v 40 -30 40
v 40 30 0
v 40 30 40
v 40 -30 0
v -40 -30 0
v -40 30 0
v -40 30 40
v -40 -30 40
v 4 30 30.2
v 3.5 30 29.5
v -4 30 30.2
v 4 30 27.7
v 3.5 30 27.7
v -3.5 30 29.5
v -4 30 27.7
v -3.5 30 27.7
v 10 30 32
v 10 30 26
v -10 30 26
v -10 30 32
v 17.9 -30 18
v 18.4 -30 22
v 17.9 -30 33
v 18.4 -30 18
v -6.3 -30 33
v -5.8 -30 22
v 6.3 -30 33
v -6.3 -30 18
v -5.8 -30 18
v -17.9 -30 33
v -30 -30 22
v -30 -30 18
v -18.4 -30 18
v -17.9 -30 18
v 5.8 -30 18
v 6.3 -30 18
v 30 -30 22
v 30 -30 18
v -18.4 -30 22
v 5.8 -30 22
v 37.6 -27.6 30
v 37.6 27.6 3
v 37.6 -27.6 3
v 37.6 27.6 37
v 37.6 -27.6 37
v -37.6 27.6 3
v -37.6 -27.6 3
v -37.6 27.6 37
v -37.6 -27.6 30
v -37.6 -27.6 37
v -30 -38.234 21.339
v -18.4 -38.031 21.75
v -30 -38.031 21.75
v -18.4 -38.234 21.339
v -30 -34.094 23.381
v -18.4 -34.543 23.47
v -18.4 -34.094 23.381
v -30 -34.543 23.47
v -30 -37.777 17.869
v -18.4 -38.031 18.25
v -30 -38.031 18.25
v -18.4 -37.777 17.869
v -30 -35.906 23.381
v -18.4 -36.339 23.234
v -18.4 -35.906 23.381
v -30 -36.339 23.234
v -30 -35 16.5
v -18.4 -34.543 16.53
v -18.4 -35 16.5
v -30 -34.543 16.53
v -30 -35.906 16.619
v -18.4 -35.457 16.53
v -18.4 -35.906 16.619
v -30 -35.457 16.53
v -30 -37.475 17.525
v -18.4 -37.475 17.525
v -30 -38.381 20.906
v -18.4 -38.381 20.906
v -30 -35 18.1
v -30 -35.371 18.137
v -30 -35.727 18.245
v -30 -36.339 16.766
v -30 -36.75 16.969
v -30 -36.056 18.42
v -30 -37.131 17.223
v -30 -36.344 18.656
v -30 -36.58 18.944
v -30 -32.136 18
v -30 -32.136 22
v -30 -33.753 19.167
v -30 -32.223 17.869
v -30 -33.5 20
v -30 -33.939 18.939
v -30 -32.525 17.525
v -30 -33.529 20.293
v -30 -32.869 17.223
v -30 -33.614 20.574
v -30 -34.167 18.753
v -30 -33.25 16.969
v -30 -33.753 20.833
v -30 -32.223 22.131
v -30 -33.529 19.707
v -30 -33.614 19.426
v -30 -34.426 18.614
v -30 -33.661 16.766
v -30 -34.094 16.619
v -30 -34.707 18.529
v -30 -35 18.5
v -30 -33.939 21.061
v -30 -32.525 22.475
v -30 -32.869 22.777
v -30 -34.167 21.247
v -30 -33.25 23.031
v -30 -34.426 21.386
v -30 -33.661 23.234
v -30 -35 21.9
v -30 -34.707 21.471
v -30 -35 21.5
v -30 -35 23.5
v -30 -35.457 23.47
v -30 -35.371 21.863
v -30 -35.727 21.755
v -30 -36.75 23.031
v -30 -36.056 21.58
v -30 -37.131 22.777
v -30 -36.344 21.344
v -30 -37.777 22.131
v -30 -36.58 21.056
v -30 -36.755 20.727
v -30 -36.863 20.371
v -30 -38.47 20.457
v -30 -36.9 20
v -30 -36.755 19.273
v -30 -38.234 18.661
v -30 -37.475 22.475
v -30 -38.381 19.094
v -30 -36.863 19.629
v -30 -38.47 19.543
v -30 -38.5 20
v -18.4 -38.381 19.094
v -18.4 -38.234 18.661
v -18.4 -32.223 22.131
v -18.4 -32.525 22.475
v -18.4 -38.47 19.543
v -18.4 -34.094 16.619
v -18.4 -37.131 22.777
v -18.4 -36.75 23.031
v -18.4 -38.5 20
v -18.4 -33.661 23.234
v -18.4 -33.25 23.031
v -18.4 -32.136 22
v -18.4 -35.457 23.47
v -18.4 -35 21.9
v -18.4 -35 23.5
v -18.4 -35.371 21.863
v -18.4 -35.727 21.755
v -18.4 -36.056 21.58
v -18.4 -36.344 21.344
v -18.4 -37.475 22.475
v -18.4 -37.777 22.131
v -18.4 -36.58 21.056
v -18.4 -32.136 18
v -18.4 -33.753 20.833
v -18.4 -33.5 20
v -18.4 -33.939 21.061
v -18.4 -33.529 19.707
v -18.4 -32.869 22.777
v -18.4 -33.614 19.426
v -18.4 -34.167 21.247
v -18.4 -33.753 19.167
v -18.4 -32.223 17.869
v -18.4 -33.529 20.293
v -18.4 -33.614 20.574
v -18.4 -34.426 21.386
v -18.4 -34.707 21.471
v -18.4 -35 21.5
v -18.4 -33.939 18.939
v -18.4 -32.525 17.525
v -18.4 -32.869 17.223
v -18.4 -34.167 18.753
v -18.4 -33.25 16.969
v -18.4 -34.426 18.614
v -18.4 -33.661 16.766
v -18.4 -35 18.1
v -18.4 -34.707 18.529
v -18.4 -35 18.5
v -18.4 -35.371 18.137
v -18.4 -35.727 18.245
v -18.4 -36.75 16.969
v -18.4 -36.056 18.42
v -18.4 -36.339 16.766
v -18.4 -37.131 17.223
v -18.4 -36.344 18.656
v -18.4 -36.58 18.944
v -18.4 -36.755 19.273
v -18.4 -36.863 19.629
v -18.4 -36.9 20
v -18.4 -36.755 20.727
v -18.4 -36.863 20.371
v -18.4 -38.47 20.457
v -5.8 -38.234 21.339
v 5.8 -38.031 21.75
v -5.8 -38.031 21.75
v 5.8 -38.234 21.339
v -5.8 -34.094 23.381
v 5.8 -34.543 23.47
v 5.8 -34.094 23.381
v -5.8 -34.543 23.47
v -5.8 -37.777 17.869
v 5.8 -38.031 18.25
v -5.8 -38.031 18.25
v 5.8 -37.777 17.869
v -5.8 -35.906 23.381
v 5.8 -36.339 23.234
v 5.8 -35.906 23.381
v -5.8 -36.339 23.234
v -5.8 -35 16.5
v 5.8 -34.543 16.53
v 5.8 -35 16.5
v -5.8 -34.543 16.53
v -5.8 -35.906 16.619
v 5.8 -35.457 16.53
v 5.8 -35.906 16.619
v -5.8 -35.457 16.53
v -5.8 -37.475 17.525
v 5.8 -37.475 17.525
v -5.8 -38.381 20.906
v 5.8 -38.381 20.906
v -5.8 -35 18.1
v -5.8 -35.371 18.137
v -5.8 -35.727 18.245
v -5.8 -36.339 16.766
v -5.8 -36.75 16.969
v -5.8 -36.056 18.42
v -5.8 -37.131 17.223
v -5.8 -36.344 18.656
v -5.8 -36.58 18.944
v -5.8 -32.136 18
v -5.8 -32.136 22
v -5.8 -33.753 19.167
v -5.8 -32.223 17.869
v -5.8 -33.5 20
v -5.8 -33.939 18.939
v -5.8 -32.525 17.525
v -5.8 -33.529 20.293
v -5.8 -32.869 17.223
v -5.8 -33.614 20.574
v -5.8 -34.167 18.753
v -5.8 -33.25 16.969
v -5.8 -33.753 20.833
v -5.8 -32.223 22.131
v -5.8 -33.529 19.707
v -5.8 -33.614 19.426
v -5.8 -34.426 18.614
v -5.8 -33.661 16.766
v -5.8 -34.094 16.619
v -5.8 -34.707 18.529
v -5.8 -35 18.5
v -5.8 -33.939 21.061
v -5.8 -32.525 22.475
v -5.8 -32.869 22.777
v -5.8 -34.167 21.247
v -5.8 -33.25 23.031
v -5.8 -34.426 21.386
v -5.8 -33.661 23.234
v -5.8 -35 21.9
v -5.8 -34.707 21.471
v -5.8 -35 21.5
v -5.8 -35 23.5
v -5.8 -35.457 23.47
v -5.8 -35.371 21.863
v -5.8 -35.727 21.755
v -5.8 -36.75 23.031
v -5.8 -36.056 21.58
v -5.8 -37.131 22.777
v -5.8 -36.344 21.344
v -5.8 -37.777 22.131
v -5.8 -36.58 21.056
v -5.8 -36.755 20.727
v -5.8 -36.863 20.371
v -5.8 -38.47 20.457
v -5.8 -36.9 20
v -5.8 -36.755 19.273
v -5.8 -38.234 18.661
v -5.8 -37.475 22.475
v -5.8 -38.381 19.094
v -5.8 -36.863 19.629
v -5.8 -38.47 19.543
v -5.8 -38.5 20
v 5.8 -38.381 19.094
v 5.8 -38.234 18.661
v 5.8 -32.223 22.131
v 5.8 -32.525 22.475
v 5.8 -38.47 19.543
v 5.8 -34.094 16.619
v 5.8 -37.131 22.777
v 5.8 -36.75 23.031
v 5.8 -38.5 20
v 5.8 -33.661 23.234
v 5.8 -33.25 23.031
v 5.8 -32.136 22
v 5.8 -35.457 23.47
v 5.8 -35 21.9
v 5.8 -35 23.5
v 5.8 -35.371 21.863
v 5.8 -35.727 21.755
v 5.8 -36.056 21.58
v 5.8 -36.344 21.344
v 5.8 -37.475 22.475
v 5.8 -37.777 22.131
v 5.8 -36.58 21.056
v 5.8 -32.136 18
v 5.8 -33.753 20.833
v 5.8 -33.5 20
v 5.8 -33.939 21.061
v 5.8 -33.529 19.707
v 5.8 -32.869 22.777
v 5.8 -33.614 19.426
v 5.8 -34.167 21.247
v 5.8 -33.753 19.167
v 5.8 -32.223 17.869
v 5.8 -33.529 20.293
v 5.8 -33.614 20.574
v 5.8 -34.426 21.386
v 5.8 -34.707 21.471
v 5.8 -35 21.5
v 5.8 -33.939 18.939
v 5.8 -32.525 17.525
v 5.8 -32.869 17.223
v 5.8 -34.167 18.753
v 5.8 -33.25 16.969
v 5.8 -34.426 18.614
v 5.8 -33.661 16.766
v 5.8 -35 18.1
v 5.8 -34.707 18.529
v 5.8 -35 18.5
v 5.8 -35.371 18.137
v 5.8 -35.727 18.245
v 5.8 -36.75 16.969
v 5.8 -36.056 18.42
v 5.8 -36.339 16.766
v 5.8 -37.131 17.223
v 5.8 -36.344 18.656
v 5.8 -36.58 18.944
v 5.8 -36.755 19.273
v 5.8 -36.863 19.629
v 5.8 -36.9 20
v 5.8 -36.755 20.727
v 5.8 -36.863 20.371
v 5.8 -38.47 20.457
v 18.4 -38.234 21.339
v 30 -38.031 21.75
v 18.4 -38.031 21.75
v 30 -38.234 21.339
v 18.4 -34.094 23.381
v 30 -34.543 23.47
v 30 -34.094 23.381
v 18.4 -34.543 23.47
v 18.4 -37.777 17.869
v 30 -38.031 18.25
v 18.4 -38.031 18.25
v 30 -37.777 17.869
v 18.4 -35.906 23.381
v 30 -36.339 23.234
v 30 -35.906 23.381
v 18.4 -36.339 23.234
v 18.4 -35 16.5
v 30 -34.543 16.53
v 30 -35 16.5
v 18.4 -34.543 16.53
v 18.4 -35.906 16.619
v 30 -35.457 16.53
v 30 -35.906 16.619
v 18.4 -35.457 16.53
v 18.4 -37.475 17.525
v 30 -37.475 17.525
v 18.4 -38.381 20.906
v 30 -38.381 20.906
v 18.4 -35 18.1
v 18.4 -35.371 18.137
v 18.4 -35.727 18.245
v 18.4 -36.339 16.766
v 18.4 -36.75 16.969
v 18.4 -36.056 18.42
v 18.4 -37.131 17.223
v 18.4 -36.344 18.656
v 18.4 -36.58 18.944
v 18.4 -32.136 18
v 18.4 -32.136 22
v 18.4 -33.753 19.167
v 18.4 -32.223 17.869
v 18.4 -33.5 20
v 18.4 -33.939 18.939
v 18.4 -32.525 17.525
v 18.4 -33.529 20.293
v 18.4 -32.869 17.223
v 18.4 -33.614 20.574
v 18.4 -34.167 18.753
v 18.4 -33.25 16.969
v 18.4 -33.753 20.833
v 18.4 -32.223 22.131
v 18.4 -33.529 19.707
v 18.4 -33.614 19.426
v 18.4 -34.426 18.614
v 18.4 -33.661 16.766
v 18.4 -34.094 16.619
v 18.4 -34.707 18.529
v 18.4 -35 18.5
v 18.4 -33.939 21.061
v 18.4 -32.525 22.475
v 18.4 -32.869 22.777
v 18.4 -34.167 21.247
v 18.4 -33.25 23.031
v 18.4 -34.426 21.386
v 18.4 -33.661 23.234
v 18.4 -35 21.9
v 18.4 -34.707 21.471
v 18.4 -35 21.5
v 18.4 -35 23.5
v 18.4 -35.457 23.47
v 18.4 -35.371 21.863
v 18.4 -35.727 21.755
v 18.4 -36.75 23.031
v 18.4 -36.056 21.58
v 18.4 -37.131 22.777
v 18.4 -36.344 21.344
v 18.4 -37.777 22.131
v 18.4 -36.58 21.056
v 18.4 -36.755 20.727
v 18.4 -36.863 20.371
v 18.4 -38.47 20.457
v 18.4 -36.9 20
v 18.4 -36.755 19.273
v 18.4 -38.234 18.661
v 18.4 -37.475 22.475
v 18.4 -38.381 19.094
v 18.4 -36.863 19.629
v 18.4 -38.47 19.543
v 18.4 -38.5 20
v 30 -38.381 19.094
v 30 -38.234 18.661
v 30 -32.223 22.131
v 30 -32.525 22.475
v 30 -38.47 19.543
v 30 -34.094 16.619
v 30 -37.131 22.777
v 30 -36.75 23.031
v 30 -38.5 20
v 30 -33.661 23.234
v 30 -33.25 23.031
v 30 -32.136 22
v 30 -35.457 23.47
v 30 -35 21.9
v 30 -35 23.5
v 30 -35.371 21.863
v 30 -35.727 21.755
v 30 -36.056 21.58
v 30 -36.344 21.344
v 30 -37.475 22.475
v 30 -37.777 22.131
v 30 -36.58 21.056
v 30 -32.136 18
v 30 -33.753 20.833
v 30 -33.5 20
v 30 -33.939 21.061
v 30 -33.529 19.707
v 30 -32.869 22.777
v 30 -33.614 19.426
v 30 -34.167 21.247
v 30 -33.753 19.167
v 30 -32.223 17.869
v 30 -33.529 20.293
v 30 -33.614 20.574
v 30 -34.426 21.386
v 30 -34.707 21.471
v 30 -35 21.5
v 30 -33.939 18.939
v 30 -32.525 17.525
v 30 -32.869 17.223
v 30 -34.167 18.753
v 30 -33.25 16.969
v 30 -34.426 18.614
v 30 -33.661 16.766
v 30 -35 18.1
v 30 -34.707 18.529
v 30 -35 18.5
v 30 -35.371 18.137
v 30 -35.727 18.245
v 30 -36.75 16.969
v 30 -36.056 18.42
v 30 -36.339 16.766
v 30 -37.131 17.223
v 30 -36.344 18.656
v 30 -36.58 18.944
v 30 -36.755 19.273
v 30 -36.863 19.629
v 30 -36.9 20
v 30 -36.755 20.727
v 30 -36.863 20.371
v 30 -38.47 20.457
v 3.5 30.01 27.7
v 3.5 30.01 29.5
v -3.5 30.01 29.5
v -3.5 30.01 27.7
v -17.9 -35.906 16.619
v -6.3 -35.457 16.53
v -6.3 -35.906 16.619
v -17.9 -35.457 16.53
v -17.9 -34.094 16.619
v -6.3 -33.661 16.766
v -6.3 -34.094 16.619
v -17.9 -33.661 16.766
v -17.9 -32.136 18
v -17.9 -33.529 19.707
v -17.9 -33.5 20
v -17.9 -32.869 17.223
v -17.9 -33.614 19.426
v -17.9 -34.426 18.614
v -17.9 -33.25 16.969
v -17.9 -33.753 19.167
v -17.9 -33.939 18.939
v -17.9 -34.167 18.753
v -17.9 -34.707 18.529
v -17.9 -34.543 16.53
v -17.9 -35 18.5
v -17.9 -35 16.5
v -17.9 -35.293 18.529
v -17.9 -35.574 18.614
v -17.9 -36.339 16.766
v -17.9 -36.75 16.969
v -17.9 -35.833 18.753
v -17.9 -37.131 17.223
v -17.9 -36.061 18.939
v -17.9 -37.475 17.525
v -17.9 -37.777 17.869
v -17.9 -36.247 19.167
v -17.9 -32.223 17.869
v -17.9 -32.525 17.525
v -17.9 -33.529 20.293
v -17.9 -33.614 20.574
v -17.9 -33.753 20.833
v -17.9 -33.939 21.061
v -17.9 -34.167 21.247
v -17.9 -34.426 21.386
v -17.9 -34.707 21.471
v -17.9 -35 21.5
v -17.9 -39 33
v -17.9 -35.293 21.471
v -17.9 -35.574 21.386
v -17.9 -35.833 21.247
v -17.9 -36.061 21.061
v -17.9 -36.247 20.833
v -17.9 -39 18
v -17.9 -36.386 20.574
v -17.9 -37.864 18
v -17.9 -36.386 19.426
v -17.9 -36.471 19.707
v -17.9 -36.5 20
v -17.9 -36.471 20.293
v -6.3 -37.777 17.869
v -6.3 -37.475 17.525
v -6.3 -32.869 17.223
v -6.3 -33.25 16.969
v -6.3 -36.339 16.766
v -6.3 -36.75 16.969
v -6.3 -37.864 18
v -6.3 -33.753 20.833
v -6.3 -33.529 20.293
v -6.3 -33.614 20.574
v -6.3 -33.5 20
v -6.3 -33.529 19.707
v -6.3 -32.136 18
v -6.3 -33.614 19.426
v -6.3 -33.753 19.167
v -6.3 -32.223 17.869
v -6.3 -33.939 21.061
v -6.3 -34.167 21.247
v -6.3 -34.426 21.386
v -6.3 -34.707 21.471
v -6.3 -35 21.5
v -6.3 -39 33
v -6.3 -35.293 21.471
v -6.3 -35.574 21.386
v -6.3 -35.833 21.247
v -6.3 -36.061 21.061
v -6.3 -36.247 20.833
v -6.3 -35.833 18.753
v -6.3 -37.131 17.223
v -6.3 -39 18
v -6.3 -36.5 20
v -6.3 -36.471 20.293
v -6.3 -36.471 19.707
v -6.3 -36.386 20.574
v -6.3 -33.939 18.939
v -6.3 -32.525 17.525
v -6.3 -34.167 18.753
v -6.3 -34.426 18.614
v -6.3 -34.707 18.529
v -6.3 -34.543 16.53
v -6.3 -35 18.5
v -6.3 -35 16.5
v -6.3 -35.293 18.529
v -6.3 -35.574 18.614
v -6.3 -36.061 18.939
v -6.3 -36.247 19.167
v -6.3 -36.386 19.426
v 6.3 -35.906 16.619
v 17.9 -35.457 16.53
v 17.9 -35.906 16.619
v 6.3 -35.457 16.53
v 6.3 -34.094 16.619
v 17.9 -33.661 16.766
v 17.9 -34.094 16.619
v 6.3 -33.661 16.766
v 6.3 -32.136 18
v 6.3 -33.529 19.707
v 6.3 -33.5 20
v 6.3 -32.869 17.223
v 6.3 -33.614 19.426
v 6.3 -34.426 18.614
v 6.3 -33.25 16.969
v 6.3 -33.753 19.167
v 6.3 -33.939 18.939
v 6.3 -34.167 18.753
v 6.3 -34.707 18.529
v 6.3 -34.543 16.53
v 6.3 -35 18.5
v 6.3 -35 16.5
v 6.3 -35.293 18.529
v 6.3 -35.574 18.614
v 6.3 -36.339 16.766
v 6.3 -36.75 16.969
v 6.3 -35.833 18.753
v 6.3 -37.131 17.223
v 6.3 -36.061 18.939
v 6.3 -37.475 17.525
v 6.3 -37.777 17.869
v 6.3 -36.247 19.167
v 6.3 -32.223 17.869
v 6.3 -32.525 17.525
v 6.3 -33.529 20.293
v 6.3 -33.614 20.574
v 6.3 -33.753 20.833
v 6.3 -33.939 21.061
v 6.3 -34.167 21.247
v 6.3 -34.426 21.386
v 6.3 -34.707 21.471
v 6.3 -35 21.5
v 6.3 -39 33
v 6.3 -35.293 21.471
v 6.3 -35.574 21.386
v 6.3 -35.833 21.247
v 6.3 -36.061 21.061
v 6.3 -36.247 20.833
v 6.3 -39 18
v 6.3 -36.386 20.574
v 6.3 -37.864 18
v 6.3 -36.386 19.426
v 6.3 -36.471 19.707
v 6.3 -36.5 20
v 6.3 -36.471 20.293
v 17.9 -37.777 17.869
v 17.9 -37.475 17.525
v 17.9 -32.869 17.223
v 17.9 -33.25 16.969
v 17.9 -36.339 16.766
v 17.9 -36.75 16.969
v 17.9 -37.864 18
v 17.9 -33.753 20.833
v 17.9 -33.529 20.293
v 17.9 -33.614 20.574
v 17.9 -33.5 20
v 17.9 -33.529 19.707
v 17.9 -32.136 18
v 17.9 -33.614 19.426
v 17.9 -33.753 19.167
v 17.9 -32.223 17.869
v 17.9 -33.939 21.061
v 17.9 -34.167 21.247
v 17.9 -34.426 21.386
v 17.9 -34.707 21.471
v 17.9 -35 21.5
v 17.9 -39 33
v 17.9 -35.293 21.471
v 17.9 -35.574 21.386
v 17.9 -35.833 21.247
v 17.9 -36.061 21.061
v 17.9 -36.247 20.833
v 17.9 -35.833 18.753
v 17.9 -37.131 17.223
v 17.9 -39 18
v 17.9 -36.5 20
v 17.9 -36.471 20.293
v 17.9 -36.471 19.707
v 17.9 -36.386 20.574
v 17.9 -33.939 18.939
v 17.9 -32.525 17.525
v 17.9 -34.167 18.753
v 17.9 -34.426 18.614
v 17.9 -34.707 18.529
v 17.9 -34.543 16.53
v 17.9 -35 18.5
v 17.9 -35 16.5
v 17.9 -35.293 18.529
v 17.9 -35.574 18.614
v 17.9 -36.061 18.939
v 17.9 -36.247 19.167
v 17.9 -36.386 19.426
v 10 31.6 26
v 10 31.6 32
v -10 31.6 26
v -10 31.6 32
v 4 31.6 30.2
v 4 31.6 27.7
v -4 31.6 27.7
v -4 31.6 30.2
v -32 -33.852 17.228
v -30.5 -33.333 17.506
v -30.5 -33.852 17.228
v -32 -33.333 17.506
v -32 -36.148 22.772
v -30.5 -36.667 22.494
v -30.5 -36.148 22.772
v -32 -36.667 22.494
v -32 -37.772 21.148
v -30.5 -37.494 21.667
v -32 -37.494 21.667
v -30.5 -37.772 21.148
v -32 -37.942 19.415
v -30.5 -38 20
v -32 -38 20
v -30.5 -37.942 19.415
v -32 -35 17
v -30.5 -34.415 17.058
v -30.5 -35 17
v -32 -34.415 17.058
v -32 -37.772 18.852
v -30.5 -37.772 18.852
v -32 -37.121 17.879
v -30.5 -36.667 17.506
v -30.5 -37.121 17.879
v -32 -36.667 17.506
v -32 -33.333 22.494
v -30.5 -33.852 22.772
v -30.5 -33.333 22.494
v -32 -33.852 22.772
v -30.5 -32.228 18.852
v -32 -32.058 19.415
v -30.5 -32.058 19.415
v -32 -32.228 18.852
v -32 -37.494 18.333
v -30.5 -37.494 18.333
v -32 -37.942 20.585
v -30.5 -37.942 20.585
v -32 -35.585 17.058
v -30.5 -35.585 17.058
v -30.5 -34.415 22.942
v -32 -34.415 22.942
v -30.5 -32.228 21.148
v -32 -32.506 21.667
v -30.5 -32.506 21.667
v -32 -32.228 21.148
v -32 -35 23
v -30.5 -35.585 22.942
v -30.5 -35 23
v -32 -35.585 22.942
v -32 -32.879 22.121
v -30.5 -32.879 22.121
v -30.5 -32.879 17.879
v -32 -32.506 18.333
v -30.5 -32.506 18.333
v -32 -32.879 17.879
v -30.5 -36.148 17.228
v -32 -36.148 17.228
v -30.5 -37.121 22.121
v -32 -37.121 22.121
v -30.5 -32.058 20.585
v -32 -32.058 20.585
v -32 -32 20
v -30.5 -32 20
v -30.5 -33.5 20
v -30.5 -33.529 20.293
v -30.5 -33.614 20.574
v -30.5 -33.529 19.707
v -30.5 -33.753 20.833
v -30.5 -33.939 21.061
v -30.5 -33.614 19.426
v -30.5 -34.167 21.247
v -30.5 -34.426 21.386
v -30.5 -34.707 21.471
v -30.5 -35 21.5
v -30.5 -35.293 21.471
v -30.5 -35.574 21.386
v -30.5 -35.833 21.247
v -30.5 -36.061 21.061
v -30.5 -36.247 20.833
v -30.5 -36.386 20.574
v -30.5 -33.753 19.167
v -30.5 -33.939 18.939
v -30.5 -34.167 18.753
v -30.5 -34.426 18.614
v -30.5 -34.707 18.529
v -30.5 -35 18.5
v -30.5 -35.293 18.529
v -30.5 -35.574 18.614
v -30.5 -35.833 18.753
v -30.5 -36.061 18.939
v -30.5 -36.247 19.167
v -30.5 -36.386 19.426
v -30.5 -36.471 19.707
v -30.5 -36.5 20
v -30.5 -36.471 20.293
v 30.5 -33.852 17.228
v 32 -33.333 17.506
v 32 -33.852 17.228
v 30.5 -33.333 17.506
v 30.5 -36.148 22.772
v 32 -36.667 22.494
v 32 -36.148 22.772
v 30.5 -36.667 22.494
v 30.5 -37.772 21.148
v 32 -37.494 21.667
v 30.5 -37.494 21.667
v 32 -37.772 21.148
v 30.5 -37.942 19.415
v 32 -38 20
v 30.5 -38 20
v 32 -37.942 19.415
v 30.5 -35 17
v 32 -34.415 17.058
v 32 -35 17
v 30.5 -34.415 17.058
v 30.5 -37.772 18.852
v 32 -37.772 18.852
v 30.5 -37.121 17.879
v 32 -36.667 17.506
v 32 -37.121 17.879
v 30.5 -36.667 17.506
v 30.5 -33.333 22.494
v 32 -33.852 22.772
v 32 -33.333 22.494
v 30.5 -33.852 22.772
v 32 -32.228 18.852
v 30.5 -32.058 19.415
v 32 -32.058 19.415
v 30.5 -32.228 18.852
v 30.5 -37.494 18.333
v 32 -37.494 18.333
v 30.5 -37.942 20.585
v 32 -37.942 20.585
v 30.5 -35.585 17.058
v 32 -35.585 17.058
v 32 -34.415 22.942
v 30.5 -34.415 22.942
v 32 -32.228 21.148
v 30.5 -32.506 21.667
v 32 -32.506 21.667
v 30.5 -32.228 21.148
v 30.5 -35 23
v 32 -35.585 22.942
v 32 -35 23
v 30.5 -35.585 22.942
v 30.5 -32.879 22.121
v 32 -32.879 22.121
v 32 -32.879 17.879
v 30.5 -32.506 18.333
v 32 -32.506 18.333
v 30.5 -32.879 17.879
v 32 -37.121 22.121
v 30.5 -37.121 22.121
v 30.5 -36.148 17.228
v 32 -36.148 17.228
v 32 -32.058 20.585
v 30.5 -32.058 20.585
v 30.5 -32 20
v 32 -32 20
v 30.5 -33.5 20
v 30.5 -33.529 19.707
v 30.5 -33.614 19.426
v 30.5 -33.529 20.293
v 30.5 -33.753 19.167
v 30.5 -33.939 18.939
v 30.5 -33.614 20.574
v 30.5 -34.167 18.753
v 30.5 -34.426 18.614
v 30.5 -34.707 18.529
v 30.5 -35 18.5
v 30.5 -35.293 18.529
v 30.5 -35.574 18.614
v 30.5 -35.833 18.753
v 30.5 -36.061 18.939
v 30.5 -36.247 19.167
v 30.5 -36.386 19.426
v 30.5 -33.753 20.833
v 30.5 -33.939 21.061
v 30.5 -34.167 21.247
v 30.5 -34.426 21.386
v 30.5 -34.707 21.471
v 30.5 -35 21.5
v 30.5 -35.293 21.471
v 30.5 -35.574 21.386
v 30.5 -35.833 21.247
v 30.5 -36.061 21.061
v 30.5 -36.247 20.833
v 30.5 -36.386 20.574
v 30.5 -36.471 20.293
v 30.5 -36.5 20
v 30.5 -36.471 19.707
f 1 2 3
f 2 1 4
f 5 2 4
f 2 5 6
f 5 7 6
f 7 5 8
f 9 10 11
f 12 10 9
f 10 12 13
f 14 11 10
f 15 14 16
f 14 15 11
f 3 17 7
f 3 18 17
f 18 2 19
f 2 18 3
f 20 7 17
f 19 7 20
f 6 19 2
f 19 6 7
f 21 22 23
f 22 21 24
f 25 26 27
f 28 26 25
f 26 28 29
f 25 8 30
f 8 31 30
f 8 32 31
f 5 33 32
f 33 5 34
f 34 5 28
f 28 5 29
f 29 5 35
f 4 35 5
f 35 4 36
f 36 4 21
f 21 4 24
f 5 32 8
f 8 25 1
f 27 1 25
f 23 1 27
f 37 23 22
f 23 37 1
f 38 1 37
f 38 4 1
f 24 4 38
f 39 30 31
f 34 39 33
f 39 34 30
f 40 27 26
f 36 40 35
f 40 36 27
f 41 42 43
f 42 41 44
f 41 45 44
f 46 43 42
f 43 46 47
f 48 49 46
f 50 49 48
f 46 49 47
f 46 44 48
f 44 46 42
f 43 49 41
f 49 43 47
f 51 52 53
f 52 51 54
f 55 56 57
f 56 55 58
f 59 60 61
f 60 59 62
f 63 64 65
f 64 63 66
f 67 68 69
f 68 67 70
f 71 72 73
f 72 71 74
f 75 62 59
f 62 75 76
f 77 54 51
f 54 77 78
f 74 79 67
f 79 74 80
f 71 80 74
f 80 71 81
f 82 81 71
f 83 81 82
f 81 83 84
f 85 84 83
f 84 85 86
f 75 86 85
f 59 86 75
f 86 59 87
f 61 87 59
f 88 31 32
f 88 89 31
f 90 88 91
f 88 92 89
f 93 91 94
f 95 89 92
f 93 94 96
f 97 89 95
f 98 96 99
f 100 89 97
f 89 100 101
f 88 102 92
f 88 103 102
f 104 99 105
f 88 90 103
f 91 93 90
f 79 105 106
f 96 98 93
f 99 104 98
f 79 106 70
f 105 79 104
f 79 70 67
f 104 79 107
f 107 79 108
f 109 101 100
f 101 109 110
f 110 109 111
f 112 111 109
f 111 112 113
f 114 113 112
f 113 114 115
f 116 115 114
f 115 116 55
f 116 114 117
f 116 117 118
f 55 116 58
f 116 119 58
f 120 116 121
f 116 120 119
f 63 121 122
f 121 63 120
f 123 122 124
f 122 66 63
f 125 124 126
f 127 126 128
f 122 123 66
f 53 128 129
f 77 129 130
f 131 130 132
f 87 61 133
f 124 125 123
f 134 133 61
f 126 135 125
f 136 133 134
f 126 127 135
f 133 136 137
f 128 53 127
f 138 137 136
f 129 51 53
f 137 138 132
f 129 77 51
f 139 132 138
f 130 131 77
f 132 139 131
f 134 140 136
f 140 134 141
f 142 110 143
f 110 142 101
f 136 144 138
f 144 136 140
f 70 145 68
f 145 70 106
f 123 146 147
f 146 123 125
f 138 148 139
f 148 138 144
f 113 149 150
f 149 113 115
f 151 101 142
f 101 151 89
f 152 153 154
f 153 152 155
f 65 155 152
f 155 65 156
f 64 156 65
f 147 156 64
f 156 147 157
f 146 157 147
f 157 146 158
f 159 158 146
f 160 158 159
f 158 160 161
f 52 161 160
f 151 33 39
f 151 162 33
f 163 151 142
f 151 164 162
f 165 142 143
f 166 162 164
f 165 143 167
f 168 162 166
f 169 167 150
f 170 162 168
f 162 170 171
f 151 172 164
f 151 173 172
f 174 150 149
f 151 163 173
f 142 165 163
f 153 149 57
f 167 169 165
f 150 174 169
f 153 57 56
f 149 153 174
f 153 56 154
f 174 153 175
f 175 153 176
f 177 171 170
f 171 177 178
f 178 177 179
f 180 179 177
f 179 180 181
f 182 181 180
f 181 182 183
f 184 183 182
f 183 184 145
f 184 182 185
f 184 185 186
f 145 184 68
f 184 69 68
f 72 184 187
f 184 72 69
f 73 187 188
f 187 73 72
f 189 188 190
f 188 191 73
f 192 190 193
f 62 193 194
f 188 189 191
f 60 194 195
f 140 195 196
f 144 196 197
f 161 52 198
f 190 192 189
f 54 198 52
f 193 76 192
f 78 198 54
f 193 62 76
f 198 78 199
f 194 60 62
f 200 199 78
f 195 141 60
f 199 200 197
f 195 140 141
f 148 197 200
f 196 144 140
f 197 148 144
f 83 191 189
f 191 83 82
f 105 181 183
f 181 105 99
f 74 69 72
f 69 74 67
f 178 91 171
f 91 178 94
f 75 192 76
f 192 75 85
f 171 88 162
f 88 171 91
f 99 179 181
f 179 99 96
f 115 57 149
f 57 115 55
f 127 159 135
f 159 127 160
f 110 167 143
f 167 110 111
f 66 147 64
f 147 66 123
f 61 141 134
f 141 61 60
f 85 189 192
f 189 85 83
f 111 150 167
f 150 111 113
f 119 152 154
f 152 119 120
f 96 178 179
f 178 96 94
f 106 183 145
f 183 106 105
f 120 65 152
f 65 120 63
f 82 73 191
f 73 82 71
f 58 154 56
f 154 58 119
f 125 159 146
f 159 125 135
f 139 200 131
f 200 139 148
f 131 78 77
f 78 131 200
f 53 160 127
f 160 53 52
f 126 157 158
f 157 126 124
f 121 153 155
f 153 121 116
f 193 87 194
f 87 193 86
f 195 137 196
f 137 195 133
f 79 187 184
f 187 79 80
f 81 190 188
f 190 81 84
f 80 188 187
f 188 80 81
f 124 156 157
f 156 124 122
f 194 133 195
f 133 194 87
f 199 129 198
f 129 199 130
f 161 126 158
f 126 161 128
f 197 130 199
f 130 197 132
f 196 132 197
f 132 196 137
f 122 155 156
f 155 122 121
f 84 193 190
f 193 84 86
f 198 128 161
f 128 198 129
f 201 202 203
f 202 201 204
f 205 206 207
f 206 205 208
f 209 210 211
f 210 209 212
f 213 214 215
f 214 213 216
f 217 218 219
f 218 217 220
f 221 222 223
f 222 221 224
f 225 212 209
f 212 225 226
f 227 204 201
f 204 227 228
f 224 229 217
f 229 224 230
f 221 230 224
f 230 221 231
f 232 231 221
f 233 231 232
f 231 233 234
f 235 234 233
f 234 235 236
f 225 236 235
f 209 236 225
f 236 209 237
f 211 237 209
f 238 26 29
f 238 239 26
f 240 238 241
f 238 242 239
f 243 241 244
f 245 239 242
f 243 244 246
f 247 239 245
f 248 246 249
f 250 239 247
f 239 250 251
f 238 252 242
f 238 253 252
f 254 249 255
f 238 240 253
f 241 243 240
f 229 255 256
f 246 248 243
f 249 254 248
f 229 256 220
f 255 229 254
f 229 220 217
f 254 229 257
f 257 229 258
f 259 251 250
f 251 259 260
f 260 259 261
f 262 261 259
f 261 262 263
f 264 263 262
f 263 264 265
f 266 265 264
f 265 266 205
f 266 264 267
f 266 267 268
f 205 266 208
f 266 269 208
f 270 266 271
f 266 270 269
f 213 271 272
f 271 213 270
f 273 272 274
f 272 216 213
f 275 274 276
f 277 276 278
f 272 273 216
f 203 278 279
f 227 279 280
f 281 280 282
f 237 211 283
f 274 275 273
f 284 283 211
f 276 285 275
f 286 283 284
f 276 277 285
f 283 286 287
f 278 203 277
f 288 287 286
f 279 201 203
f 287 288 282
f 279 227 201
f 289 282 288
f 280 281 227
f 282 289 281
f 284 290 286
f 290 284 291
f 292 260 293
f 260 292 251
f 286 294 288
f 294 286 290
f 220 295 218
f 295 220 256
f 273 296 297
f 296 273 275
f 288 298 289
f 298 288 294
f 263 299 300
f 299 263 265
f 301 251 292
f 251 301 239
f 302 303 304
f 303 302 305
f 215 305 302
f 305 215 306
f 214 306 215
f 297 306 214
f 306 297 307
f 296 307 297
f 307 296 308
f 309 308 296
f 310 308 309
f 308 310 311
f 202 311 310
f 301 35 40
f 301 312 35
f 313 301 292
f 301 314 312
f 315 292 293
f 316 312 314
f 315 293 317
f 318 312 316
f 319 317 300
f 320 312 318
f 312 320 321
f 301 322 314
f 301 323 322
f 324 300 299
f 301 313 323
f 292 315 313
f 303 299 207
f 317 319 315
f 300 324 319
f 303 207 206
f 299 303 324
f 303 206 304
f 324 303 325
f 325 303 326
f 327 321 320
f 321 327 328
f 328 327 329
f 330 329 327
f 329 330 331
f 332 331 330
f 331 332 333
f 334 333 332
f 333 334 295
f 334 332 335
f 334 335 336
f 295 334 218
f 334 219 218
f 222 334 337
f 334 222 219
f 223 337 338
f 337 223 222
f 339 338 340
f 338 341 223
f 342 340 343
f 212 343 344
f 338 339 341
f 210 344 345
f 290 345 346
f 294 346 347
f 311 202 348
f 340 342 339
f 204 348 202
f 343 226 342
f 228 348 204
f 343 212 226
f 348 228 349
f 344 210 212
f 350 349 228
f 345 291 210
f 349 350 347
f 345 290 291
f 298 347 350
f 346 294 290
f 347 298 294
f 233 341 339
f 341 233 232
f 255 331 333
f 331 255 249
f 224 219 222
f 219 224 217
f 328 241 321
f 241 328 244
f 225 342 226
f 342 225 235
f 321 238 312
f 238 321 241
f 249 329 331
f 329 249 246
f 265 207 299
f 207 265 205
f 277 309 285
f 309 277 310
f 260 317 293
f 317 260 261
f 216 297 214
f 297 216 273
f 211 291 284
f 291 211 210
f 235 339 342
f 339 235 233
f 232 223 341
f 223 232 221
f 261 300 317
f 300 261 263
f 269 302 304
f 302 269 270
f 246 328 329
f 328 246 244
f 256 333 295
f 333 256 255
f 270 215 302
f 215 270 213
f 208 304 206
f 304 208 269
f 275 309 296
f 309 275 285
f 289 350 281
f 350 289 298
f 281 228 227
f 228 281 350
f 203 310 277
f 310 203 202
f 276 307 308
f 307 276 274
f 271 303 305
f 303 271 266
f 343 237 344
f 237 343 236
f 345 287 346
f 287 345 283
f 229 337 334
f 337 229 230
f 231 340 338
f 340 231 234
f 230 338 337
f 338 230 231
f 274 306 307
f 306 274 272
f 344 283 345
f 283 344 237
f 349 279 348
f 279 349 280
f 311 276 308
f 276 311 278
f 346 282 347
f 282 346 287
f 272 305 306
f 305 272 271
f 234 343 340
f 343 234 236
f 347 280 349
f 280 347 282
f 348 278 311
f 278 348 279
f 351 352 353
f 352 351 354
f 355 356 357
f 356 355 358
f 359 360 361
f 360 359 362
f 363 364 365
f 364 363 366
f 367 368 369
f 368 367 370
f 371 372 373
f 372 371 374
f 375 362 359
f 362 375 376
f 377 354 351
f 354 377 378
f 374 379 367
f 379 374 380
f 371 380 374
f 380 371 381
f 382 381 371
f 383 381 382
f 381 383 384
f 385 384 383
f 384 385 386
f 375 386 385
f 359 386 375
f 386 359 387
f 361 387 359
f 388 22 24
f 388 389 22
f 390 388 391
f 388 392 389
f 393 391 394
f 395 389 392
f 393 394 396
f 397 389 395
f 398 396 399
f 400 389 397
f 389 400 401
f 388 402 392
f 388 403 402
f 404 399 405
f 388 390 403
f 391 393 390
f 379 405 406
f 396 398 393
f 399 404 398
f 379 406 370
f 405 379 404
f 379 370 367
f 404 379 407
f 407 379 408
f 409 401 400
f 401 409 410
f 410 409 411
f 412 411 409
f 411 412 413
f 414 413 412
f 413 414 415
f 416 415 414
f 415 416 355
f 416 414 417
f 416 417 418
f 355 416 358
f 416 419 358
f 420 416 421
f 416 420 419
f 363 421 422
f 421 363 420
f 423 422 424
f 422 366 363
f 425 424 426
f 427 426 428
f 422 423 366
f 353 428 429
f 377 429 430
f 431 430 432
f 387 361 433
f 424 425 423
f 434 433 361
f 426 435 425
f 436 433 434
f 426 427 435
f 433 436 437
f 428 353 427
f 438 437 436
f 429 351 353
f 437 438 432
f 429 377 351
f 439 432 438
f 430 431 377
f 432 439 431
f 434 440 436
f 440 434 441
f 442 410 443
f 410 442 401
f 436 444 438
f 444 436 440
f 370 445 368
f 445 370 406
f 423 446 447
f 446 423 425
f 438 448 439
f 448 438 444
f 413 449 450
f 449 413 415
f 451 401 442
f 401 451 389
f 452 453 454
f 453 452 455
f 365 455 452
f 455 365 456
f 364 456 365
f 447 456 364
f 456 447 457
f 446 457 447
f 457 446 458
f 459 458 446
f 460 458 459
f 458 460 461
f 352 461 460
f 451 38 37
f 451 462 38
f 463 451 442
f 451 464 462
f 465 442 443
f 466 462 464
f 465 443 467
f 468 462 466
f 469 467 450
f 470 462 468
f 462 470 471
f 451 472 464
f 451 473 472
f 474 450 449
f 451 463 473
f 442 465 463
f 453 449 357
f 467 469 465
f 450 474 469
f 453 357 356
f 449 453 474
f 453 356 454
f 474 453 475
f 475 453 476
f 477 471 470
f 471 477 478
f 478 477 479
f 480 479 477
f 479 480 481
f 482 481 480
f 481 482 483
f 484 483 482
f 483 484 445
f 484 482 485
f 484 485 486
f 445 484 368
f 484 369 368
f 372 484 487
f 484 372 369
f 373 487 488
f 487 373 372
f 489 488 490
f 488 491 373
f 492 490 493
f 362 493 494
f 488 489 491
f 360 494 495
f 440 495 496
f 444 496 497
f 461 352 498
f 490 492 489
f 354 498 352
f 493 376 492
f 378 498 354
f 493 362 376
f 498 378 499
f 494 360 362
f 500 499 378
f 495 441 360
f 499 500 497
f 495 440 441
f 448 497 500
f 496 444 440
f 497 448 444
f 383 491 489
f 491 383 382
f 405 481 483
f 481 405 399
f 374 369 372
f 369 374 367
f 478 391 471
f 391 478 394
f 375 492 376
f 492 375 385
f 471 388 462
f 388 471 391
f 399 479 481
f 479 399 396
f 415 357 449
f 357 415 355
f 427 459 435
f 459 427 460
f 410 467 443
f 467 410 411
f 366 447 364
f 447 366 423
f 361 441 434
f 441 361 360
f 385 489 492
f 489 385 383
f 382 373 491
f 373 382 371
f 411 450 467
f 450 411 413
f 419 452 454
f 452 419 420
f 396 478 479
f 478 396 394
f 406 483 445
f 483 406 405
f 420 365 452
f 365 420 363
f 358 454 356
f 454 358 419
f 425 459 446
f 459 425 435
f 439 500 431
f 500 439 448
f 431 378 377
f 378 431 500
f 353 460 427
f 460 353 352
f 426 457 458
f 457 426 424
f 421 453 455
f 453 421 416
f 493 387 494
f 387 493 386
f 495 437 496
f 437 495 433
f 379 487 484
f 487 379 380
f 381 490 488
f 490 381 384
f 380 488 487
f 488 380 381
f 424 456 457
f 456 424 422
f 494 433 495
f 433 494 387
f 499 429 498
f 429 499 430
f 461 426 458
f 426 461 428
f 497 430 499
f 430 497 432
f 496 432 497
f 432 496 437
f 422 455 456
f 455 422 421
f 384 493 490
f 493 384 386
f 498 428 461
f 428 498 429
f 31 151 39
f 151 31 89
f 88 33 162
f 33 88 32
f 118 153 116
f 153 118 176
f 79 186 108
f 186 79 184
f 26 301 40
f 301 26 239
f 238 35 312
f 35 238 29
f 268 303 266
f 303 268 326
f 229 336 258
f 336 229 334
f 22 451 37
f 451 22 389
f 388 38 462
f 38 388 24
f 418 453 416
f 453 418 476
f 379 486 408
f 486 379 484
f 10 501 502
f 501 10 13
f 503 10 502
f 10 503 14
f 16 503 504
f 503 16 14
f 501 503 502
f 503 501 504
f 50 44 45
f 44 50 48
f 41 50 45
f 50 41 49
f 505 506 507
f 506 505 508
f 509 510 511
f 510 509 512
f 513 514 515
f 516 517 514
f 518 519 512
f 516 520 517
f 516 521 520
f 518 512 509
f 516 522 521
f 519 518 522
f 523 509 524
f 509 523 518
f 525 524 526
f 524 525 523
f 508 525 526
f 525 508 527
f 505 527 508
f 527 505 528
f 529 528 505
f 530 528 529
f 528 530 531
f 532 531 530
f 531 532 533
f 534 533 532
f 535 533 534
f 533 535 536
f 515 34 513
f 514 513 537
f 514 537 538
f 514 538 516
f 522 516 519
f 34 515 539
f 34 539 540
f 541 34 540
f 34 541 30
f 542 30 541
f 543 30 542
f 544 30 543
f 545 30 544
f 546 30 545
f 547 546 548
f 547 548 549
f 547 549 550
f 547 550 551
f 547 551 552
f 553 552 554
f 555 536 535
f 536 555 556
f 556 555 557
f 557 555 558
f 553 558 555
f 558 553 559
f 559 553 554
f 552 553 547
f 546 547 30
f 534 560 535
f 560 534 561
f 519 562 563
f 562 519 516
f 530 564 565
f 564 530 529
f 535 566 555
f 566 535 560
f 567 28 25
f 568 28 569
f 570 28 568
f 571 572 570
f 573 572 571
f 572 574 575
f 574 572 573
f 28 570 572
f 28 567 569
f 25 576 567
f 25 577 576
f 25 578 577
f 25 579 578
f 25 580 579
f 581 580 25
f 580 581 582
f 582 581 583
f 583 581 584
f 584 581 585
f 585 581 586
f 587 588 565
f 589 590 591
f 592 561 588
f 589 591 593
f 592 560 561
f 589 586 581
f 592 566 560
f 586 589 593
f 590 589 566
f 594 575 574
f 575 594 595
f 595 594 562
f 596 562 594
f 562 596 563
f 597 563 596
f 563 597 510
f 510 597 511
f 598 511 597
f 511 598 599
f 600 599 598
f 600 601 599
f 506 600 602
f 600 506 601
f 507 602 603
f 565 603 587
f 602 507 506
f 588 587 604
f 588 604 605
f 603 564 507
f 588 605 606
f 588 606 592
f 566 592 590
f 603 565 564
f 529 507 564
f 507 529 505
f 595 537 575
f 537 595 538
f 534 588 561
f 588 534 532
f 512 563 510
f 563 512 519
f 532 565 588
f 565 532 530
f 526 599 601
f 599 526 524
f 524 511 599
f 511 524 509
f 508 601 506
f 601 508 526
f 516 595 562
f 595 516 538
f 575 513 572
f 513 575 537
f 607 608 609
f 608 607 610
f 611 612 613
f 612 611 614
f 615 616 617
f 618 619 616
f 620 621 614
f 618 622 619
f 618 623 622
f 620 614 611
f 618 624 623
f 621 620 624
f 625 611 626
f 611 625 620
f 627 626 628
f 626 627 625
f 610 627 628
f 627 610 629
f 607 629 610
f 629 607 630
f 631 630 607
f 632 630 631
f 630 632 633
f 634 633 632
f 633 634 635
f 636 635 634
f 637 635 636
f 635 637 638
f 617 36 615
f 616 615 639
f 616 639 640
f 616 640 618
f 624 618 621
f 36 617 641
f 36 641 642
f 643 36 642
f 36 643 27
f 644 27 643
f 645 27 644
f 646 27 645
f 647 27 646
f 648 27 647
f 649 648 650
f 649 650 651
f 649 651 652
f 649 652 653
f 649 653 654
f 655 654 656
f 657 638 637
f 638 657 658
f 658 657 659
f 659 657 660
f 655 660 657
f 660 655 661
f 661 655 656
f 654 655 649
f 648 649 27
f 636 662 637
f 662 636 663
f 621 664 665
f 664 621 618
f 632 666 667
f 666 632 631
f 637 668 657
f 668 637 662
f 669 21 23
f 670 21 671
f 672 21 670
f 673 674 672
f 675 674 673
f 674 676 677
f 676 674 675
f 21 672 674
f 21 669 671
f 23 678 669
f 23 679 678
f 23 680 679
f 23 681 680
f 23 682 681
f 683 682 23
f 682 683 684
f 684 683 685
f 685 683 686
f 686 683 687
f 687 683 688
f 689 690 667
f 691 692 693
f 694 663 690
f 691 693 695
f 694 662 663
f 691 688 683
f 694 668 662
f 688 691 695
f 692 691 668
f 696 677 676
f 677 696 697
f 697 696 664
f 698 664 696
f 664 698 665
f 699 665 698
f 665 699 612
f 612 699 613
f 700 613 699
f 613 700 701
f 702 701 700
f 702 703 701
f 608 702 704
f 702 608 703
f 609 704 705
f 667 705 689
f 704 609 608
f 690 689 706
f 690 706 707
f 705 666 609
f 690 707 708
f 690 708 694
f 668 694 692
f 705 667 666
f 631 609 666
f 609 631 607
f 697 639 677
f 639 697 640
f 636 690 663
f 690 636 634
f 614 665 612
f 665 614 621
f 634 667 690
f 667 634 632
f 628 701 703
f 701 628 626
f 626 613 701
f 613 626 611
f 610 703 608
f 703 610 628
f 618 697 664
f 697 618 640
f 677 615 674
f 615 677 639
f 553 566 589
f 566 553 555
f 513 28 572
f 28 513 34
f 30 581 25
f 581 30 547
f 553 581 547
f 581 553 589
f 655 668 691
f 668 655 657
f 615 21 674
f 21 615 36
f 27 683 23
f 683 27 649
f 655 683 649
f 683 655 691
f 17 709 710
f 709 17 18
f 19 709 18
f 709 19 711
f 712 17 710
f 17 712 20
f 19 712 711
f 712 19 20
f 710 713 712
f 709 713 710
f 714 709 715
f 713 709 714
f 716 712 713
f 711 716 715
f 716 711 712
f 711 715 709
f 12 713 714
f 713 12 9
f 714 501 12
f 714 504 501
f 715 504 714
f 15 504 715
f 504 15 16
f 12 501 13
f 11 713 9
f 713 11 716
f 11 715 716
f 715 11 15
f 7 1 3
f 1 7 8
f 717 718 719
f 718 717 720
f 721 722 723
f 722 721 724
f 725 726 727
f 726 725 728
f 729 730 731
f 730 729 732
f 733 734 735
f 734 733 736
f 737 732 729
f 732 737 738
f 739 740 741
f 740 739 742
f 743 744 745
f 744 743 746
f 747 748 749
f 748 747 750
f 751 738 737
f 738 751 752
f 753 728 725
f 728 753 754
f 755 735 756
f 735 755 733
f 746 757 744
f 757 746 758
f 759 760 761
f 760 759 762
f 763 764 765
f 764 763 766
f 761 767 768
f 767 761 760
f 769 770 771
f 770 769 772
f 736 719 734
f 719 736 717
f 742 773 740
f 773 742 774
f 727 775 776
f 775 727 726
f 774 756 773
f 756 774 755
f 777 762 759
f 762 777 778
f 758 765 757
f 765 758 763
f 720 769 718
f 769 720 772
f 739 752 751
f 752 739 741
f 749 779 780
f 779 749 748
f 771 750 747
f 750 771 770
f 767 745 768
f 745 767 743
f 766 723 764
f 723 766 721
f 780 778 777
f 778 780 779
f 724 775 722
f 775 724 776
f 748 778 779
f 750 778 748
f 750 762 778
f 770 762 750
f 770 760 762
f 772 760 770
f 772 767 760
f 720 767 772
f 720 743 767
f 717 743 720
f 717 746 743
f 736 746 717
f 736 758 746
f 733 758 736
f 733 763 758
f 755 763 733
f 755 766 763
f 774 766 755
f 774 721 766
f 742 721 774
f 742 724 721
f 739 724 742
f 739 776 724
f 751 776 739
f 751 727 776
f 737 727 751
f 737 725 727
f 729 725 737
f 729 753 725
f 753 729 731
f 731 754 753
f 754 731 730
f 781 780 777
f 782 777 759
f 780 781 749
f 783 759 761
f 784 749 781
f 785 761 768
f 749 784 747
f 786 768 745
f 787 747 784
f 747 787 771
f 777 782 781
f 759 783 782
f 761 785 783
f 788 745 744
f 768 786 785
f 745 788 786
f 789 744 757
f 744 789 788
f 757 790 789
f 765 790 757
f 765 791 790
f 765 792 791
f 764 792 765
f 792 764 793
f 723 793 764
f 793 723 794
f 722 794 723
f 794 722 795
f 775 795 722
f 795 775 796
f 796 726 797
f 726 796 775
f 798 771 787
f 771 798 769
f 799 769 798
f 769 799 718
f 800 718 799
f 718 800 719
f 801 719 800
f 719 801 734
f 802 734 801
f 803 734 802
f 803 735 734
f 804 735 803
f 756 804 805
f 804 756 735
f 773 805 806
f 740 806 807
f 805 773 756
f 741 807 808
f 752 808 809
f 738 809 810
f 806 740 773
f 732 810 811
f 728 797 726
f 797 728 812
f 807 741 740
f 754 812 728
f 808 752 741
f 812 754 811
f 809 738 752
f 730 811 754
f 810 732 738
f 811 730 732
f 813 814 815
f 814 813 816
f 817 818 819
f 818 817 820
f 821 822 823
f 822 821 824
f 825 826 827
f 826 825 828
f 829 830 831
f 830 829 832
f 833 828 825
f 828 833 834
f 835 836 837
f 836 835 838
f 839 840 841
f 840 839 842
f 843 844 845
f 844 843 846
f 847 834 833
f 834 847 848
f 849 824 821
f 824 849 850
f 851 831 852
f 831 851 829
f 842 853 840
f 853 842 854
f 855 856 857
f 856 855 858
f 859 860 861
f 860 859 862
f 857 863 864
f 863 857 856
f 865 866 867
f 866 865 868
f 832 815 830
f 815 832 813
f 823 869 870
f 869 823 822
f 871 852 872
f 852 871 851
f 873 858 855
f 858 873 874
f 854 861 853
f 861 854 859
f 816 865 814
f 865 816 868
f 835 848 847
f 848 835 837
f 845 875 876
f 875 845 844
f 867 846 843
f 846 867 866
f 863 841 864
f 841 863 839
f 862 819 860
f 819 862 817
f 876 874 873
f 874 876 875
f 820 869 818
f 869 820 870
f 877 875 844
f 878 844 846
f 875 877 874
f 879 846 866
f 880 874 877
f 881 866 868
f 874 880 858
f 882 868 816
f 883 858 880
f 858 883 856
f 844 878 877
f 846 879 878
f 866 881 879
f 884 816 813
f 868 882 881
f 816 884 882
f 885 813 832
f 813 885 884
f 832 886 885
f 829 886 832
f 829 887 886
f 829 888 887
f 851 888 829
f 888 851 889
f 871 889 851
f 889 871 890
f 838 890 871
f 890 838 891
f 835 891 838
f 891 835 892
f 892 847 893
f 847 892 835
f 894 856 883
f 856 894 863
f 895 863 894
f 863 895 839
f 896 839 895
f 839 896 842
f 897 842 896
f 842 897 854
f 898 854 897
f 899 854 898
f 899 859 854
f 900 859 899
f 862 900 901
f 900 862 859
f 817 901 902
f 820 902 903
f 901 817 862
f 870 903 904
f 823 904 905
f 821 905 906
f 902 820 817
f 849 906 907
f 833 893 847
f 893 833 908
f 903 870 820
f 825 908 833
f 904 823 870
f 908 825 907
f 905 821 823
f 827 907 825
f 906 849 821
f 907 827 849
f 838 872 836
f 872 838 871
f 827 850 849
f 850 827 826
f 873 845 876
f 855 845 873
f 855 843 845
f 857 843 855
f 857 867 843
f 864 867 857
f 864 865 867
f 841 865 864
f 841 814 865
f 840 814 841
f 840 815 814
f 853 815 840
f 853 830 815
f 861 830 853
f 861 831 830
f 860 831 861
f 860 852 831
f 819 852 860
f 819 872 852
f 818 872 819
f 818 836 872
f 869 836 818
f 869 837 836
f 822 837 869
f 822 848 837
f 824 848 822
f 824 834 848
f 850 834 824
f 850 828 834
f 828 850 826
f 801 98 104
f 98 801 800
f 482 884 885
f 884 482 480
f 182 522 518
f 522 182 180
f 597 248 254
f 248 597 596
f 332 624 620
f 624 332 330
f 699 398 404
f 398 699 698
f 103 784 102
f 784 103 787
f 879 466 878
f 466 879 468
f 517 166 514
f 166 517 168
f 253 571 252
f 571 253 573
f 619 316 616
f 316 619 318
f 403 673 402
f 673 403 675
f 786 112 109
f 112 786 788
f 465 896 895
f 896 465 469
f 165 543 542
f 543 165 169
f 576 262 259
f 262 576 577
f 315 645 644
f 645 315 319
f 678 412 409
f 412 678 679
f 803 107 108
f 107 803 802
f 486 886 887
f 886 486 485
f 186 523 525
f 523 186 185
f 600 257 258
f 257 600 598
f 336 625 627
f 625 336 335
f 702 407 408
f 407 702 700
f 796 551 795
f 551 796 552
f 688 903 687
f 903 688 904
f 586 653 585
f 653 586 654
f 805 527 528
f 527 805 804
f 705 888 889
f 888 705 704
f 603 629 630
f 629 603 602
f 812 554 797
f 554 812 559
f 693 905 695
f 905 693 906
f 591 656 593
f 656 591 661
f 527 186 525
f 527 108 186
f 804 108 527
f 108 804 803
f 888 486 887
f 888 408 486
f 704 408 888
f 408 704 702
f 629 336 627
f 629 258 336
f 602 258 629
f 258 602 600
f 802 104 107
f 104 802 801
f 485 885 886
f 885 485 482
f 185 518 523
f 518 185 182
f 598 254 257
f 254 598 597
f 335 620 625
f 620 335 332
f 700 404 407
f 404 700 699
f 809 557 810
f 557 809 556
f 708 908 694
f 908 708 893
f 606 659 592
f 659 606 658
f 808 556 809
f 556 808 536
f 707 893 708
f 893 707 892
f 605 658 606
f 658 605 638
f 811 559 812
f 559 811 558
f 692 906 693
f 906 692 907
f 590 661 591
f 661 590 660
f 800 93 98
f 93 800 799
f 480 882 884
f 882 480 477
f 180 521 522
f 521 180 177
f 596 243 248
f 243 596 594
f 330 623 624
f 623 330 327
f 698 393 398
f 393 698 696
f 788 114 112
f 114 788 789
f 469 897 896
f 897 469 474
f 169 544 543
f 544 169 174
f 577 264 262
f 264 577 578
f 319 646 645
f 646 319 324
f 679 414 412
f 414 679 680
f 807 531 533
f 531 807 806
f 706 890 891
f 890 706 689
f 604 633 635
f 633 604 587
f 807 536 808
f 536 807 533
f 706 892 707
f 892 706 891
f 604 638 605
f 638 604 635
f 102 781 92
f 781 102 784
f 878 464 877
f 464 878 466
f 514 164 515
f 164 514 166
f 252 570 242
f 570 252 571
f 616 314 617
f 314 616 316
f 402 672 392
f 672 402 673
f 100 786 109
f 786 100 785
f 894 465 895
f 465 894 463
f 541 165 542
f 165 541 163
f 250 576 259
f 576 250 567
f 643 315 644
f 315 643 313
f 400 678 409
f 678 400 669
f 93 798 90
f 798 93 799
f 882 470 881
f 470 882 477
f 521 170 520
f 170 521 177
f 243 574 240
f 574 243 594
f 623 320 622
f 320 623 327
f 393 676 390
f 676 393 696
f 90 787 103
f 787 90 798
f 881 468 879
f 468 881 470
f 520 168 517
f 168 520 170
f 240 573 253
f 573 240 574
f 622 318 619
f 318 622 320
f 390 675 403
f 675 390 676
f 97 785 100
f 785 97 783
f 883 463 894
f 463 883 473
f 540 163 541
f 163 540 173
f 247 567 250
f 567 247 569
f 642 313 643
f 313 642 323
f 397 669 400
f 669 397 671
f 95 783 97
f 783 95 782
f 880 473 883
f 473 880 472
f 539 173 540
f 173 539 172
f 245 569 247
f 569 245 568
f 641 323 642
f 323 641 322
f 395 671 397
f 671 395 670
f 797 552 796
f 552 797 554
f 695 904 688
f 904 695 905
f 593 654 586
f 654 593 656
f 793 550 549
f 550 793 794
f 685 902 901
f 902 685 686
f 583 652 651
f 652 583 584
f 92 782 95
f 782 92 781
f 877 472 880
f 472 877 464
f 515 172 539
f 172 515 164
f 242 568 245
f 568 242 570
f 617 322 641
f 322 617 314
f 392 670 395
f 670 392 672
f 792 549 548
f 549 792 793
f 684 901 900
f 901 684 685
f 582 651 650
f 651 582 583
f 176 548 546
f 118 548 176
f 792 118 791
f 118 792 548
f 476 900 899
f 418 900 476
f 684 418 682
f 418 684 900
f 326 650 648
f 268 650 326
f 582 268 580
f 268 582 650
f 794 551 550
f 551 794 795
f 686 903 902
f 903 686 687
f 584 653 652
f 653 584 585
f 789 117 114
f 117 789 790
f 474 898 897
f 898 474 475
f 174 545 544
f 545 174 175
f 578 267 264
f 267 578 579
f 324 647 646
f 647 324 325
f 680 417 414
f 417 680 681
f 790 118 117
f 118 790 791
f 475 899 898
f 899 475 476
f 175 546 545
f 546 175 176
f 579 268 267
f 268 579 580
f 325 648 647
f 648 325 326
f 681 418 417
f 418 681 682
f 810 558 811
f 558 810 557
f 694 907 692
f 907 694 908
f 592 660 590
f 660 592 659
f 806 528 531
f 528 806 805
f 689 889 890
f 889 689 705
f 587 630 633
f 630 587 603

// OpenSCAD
/* Box with print-in-place hinge */
part = "assembly"; // [base, lid, pin, assembly]
cadverify_only = "";
module instance(name, part, unit = 1) {
    echo(cadverify_instance = [name, part, unit]);
    if (cadverify_only == "" || cadverify_only == name) children();
}
Bx=80; By=60; Hb=30; Hl=10; Wt=2.4; Bt=3; Lt=3;
Ya=-35; Za=20;
Kr=3.5; Br=1.9; Pr=1.5; CapR=3.0; CapT=1.5;
Hxmin=-30; Hxmax=30;
Lk=11.6;
function seg(i) =
  i==0 ? [Hxmin, Hxmin+Lk] :
  i==1 ? [Hxmin+Lk+0.5, Hxmin+2*Lk+0.5] :
  i==2 ? [Hxmin+2*Lk+1.0, Hxmin+3*Lk+1.0] :
  i==3 ? [Hxmin+3*Lk+1.5, Hxmin+4*Lk+1.5] :
         [Hxmin+4*Lk+2.0, Hxmax];
module knuckle(x0,x1,y,z,r_out,r_in) {
  difference() {
    translate([0,y,z]) rotate([0,90,0]) translate([0,0,(x0+x1)/2]) cylinder(h=x1-x0, r=r_out, center=true, $fn=48);
    translate([0,y,z]) rotate([0,90,0]) translate([0,0,(x0+x1)/2-0.5]) cylinder(h=(x1-x0)+1.0, r=r_in, center=true, $fn=32);
  }
}
module base_geom() {
  difference() {
    translate([-Bx/2,-By/2,0]) cube([Bx,By,Hb]);
    translate([-Bx/2+Wt,-By/2+Wt,Bt]) cube([Bx-2*Wt,By-2*Wt,Hb]);
  }
  for (s=[0,2,4]) { a=seg(s); translate([(a[0]+a[1])/2,0,0]) {
    translate([-(a[1]-a[0])/2+0,0,0]) cube([(a[1]-a[0]),0,0]); }
    translate([a[0],-35,18]) cube([a[1]-a[0],6,4]);
    knuckle(a[0],a[1],Ya,Za,Kr,Br);
  }
  // catch nub on front wall (y=+30)
  translate([-3.5,30,27.5]) cube([7,0.01,2.0]);
  polyhedron(points=[[-3.5,30,27.5],[3.5,30,27.5],[3.5,30,29.5],[-3.5,30,29.5],[-3.5,31.2,28.7],[3.5,31.2,28.7],[3.5,31.2,29.5],[-3.5,31.2,29.5]], faces=[[0,1,2,3],[4,5,6,7],[0,1,5,4],[1,2,6,5],[2,3,7,6],[3,0,4,7]]);
}
module lid_geom() {
  // print pose: plate at z 0-3, y -100..-40
  translate([-Bx/2,-100,0]) cube([Bx,60,Lt]);
  difference() {
    translate([-Bx/2,-100,Lt]) cube([Bx,60,7]);
    translate([-Bx/2+Wt,-97.6,Lt]) cube([Bx-2*Wt,55.2,7]);
  }
  for (s=[1,3]) { a=seg(s);
    translate([a[0],-42,7]) cube([a[1]-a[0],11,15]);
    knuckle(a[0],a[1],Ya,Za,Kr,Br);
  }
  // front skirt outside far wall (y=-100 side)
  difference() {
    translate([-10,-101.6,8]) cube([20,2.6,6]);
    translate([-4,-102,9.8]) cube([8,3.2,2.5]);
  }
}
module pin_geom() {
  translate([0,Ya,Za]) rotate([0,90,0]) translate([0,0,0]) cylinder(h=64, r=Pr, center=true, $fn=32);
  for (sx=[-1,1]) translate([sx*31.25,Ya,Za]) rotate([0,90,0]) cylinder(h=CapT, r=CapR, center=true, $fn=32);
}
if (part=="base") base_geom();
else if (part=="lid") lid_geom();
else if (part=="pin") pin_geom();
else if (part=="assembly") {
  instance("base","base") base_geom();
  instance("lid","lid") translate([0,Ya,Za]) rotate([180,0,0]) translate([0,-Ya,-Za]) lid_geom();
  instance("pin","pin") pin_geom();
}
